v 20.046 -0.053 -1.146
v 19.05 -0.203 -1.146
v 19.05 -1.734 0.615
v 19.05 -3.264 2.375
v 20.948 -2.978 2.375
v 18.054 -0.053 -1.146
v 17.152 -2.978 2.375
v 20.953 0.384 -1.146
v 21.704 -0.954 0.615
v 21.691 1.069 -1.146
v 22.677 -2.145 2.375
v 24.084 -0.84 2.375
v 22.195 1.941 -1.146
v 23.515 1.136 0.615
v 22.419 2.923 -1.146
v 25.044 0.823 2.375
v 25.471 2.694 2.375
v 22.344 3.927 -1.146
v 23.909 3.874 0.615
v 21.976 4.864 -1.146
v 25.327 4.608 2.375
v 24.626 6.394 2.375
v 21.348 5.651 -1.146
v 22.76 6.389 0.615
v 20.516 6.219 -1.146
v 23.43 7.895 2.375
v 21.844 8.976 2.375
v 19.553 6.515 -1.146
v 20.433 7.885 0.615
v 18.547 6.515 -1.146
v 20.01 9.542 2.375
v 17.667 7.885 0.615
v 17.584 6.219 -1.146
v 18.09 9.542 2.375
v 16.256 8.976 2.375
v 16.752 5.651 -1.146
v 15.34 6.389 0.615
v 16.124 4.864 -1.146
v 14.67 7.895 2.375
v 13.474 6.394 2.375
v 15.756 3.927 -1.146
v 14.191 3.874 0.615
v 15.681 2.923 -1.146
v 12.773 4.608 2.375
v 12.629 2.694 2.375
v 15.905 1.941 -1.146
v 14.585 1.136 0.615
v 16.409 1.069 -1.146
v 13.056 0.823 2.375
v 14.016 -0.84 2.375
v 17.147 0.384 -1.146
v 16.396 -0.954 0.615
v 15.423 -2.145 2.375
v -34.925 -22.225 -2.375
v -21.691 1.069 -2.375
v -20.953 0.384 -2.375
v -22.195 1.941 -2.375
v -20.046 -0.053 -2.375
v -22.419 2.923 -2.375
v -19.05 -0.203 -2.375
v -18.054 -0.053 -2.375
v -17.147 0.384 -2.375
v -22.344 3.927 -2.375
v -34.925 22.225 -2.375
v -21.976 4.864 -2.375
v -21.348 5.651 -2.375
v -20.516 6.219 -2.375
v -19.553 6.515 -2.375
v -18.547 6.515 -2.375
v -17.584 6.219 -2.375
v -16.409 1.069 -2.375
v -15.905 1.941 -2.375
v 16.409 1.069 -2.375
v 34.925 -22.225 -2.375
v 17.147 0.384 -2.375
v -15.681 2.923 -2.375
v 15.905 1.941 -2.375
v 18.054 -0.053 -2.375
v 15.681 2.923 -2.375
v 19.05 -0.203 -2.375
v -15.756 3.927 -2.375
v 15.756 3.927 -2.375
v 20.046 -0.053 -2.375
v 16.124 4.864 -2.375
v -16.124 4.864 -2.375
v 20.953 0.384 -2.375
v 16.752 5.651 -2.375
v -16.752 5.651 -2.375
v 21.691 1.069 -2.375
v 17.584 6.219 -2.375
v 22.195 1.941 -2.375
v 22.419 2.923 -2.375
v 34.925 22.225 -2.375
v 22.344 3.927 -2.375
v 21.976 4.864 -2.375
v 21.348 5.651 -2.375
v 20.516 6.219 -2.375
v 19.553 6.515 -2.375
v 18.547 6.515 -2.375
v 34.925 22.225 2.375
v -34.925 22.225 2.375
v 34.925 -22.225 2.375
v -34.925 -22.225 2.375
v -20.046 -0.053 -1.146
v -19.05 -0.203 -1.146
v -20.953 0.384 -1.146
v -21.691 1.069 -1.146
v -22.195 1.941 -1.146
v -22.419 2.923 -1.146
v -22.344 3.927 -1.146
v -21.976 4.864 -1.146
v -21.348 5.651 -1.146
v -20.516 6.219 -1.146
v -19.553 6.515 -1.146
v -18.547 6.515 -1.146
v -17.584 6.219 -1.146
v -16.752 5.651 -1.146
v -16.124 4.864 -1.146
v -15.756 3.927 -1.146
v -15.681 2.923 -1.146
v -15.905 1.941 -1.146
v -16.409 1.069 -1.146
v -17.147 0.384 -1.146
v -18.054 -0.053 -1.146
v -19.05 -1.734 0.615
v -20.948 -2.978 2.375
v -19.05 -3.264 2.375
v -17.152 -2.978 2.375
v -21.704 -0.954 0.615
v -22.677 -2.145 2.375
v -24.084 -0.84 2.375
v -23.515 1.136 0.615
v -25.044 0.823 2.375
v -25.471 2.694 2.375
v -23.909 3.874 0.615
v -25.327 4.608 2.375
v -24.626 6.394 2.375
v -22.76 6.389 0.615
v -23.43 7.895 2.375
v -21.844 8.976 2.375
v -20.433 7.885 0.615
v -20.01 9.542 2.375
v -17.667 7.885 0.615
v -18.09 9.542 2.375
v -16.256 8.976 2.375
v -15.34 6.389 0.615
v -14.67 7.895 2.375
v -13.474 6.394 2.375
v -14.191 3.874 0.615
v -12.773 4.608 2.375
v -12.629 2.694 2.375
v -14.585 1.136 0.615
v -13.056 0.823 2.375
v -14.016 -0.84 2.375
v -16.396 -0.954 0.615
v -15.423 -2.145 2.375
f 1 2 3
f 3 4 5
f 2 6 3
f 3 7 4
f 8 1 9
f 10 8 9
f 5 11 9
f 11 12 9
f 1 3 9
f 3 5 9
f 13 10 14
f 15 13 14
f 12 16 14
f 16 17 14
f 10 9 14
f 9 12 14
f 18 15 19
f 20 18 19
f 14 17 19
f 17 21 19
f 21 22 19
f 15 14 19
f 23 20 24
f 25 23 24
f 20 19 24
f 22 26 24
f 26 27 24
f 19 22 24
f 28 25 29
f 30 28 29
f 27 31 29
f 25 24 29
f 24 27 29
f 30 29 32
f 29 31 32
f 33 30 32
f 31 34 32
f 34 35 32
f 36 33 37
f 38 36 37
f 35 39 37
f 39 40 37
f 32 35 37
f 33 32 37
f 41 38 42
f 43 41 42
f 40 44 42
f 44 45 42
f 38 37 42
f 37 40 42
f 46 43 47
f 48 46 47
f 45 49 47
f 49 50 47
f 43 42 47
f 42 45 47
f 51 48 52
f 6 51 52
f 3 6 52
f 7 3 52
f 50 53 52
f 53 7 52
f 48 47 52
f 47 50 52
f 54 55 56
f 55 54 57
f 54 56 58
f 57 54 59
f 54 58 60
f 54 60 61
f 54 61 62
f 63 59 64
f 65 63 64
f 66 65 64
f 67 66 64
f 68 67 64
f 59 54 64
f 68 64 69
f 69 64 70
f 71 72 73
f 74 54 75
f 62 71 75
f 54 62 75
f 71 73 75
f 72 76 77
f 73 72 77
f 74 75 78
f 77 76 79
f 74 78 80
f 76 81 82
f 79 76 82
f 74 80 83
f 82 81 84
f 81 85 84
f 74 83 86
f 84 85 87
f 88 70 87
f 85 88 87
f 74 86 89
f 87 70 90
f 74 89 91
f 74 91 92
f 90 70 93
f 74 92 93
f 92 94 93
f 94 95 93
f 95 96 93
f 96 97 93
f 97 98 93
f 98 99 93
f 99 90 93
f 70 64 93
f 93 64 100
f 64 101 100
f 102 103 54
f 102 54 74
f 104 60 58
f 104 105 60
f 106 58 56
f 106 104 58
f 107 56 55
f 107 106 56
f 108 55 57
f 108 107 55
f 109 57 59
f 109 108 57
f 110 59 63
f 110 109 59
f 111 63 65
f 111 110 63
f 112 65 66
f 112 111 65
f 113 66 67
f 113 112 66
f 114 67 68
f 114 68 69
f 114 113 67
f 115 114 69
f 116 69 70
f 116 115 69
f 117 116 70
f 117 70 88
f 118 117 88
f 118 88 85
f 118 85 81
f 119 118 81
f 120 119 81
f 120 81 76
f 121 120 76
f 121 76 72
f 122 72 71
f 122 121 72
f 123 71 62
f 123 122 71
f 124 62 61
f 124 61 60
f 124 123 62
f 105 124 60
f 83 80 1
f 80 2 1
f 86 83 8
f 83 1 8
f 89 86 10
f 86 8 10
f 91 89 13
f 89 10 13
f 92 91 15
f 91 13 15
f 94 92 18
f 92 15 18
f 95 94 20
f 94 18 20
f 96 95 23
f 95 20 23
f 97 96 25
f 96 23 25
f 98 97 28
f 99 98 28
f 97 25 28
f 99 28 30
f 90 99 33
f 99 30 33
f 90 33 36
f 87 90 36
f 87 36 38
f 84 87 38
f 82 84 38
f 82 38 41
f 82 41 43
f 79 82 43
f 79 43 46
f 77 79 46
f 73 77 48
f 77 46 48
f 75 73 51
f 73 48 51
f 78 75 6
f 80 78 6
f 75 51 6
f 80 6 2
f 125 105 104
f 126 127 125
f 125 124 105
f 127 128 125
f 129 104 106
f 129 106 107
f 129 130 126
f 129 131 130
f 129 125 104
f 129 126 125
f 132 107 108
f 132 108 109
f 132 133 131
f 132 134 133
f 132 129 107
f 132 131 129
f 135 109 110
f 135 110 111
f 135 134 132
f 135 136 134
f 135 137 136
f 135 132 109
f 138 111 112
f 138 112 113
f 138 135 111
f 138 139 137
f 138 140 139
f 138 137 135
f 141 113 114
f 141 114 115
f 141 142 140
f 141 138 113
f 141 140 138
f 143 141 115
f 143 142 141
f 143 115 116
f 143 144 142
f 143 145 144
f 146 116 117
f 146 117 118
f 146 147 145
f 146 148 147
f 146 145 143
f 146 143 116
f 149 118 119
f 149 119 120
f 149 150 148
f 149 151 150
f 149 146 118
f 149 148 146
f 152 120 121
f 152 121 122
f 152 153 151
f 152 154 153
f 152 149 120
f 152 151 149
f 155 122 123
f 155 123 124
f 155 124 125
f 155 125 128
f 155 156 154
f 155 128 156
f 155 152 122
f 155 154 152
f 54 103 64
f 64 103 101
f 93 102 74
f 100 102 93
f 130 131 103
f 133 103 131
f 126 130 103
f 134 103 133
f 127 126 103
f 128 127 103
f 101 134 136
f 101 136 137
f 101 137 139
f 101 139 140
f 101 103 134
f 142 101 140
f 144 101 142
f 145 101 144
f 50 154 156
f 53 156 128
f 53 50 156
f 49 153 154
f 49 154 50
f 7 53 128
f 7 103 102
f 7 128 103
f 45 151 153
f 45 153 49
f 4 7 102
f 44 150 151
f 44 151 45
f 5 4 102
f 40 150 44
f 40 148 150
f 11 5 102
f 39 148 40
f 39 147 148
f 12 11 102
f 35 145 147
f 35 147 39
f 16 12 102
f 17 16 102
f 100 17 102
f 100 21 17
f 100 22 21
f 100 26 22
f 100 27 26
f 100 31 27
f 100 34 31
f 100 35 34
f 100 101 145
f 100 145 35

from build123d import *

# Parameters (mm, degrees)
SKETCH1_W           = 69.85
SKETCH1_H           = 44.45
BOSS_EXTRUDE1_DEPTH = 2.375


with BuildPart() as part:
    # Sketch1 → Boss-Extrude1 (new, symmetric)
    with BuildSketch(Plane.XY):
        Rectangle(SKETCH1_W, SKETCH1_H)
    extrude(amount=BOSS_EXTRUDE1_DEPTH, both=True)

    # Sketch4 → CSK for 1/4 Flat Head Machine Screw1 (revolve, cut)
    with BuildSketch(Plane(origin=(-19.05, 3.175, 2.375), x_dir=(0, -1, 0), z_dir=(1, 0, 0))):
        Polygon((0, 0), (0, 4.75), (3.3782, 4.75), (3.3782, 3.520932584), (6.4389, 0), align=None)
    csk_for_1_4_flat_head_machine_screw1 = revolve(axis=Axis((-19.05, 3.175, 8.725), (0, 0, -1)), mode=Mode.SUBTRACT)

    # Mirror1: CSK for 1/4 Flat Head Machine Screw1 across plane
    add(csk_for_1_4_flat_head_machine_screw1.mirror(Plane(origin=(0, 0, 0), x_dir=(0, 0, 1), z_dir=(1, 0, 0))), mode=Mode.SUBTRACT)


solid = part.part
